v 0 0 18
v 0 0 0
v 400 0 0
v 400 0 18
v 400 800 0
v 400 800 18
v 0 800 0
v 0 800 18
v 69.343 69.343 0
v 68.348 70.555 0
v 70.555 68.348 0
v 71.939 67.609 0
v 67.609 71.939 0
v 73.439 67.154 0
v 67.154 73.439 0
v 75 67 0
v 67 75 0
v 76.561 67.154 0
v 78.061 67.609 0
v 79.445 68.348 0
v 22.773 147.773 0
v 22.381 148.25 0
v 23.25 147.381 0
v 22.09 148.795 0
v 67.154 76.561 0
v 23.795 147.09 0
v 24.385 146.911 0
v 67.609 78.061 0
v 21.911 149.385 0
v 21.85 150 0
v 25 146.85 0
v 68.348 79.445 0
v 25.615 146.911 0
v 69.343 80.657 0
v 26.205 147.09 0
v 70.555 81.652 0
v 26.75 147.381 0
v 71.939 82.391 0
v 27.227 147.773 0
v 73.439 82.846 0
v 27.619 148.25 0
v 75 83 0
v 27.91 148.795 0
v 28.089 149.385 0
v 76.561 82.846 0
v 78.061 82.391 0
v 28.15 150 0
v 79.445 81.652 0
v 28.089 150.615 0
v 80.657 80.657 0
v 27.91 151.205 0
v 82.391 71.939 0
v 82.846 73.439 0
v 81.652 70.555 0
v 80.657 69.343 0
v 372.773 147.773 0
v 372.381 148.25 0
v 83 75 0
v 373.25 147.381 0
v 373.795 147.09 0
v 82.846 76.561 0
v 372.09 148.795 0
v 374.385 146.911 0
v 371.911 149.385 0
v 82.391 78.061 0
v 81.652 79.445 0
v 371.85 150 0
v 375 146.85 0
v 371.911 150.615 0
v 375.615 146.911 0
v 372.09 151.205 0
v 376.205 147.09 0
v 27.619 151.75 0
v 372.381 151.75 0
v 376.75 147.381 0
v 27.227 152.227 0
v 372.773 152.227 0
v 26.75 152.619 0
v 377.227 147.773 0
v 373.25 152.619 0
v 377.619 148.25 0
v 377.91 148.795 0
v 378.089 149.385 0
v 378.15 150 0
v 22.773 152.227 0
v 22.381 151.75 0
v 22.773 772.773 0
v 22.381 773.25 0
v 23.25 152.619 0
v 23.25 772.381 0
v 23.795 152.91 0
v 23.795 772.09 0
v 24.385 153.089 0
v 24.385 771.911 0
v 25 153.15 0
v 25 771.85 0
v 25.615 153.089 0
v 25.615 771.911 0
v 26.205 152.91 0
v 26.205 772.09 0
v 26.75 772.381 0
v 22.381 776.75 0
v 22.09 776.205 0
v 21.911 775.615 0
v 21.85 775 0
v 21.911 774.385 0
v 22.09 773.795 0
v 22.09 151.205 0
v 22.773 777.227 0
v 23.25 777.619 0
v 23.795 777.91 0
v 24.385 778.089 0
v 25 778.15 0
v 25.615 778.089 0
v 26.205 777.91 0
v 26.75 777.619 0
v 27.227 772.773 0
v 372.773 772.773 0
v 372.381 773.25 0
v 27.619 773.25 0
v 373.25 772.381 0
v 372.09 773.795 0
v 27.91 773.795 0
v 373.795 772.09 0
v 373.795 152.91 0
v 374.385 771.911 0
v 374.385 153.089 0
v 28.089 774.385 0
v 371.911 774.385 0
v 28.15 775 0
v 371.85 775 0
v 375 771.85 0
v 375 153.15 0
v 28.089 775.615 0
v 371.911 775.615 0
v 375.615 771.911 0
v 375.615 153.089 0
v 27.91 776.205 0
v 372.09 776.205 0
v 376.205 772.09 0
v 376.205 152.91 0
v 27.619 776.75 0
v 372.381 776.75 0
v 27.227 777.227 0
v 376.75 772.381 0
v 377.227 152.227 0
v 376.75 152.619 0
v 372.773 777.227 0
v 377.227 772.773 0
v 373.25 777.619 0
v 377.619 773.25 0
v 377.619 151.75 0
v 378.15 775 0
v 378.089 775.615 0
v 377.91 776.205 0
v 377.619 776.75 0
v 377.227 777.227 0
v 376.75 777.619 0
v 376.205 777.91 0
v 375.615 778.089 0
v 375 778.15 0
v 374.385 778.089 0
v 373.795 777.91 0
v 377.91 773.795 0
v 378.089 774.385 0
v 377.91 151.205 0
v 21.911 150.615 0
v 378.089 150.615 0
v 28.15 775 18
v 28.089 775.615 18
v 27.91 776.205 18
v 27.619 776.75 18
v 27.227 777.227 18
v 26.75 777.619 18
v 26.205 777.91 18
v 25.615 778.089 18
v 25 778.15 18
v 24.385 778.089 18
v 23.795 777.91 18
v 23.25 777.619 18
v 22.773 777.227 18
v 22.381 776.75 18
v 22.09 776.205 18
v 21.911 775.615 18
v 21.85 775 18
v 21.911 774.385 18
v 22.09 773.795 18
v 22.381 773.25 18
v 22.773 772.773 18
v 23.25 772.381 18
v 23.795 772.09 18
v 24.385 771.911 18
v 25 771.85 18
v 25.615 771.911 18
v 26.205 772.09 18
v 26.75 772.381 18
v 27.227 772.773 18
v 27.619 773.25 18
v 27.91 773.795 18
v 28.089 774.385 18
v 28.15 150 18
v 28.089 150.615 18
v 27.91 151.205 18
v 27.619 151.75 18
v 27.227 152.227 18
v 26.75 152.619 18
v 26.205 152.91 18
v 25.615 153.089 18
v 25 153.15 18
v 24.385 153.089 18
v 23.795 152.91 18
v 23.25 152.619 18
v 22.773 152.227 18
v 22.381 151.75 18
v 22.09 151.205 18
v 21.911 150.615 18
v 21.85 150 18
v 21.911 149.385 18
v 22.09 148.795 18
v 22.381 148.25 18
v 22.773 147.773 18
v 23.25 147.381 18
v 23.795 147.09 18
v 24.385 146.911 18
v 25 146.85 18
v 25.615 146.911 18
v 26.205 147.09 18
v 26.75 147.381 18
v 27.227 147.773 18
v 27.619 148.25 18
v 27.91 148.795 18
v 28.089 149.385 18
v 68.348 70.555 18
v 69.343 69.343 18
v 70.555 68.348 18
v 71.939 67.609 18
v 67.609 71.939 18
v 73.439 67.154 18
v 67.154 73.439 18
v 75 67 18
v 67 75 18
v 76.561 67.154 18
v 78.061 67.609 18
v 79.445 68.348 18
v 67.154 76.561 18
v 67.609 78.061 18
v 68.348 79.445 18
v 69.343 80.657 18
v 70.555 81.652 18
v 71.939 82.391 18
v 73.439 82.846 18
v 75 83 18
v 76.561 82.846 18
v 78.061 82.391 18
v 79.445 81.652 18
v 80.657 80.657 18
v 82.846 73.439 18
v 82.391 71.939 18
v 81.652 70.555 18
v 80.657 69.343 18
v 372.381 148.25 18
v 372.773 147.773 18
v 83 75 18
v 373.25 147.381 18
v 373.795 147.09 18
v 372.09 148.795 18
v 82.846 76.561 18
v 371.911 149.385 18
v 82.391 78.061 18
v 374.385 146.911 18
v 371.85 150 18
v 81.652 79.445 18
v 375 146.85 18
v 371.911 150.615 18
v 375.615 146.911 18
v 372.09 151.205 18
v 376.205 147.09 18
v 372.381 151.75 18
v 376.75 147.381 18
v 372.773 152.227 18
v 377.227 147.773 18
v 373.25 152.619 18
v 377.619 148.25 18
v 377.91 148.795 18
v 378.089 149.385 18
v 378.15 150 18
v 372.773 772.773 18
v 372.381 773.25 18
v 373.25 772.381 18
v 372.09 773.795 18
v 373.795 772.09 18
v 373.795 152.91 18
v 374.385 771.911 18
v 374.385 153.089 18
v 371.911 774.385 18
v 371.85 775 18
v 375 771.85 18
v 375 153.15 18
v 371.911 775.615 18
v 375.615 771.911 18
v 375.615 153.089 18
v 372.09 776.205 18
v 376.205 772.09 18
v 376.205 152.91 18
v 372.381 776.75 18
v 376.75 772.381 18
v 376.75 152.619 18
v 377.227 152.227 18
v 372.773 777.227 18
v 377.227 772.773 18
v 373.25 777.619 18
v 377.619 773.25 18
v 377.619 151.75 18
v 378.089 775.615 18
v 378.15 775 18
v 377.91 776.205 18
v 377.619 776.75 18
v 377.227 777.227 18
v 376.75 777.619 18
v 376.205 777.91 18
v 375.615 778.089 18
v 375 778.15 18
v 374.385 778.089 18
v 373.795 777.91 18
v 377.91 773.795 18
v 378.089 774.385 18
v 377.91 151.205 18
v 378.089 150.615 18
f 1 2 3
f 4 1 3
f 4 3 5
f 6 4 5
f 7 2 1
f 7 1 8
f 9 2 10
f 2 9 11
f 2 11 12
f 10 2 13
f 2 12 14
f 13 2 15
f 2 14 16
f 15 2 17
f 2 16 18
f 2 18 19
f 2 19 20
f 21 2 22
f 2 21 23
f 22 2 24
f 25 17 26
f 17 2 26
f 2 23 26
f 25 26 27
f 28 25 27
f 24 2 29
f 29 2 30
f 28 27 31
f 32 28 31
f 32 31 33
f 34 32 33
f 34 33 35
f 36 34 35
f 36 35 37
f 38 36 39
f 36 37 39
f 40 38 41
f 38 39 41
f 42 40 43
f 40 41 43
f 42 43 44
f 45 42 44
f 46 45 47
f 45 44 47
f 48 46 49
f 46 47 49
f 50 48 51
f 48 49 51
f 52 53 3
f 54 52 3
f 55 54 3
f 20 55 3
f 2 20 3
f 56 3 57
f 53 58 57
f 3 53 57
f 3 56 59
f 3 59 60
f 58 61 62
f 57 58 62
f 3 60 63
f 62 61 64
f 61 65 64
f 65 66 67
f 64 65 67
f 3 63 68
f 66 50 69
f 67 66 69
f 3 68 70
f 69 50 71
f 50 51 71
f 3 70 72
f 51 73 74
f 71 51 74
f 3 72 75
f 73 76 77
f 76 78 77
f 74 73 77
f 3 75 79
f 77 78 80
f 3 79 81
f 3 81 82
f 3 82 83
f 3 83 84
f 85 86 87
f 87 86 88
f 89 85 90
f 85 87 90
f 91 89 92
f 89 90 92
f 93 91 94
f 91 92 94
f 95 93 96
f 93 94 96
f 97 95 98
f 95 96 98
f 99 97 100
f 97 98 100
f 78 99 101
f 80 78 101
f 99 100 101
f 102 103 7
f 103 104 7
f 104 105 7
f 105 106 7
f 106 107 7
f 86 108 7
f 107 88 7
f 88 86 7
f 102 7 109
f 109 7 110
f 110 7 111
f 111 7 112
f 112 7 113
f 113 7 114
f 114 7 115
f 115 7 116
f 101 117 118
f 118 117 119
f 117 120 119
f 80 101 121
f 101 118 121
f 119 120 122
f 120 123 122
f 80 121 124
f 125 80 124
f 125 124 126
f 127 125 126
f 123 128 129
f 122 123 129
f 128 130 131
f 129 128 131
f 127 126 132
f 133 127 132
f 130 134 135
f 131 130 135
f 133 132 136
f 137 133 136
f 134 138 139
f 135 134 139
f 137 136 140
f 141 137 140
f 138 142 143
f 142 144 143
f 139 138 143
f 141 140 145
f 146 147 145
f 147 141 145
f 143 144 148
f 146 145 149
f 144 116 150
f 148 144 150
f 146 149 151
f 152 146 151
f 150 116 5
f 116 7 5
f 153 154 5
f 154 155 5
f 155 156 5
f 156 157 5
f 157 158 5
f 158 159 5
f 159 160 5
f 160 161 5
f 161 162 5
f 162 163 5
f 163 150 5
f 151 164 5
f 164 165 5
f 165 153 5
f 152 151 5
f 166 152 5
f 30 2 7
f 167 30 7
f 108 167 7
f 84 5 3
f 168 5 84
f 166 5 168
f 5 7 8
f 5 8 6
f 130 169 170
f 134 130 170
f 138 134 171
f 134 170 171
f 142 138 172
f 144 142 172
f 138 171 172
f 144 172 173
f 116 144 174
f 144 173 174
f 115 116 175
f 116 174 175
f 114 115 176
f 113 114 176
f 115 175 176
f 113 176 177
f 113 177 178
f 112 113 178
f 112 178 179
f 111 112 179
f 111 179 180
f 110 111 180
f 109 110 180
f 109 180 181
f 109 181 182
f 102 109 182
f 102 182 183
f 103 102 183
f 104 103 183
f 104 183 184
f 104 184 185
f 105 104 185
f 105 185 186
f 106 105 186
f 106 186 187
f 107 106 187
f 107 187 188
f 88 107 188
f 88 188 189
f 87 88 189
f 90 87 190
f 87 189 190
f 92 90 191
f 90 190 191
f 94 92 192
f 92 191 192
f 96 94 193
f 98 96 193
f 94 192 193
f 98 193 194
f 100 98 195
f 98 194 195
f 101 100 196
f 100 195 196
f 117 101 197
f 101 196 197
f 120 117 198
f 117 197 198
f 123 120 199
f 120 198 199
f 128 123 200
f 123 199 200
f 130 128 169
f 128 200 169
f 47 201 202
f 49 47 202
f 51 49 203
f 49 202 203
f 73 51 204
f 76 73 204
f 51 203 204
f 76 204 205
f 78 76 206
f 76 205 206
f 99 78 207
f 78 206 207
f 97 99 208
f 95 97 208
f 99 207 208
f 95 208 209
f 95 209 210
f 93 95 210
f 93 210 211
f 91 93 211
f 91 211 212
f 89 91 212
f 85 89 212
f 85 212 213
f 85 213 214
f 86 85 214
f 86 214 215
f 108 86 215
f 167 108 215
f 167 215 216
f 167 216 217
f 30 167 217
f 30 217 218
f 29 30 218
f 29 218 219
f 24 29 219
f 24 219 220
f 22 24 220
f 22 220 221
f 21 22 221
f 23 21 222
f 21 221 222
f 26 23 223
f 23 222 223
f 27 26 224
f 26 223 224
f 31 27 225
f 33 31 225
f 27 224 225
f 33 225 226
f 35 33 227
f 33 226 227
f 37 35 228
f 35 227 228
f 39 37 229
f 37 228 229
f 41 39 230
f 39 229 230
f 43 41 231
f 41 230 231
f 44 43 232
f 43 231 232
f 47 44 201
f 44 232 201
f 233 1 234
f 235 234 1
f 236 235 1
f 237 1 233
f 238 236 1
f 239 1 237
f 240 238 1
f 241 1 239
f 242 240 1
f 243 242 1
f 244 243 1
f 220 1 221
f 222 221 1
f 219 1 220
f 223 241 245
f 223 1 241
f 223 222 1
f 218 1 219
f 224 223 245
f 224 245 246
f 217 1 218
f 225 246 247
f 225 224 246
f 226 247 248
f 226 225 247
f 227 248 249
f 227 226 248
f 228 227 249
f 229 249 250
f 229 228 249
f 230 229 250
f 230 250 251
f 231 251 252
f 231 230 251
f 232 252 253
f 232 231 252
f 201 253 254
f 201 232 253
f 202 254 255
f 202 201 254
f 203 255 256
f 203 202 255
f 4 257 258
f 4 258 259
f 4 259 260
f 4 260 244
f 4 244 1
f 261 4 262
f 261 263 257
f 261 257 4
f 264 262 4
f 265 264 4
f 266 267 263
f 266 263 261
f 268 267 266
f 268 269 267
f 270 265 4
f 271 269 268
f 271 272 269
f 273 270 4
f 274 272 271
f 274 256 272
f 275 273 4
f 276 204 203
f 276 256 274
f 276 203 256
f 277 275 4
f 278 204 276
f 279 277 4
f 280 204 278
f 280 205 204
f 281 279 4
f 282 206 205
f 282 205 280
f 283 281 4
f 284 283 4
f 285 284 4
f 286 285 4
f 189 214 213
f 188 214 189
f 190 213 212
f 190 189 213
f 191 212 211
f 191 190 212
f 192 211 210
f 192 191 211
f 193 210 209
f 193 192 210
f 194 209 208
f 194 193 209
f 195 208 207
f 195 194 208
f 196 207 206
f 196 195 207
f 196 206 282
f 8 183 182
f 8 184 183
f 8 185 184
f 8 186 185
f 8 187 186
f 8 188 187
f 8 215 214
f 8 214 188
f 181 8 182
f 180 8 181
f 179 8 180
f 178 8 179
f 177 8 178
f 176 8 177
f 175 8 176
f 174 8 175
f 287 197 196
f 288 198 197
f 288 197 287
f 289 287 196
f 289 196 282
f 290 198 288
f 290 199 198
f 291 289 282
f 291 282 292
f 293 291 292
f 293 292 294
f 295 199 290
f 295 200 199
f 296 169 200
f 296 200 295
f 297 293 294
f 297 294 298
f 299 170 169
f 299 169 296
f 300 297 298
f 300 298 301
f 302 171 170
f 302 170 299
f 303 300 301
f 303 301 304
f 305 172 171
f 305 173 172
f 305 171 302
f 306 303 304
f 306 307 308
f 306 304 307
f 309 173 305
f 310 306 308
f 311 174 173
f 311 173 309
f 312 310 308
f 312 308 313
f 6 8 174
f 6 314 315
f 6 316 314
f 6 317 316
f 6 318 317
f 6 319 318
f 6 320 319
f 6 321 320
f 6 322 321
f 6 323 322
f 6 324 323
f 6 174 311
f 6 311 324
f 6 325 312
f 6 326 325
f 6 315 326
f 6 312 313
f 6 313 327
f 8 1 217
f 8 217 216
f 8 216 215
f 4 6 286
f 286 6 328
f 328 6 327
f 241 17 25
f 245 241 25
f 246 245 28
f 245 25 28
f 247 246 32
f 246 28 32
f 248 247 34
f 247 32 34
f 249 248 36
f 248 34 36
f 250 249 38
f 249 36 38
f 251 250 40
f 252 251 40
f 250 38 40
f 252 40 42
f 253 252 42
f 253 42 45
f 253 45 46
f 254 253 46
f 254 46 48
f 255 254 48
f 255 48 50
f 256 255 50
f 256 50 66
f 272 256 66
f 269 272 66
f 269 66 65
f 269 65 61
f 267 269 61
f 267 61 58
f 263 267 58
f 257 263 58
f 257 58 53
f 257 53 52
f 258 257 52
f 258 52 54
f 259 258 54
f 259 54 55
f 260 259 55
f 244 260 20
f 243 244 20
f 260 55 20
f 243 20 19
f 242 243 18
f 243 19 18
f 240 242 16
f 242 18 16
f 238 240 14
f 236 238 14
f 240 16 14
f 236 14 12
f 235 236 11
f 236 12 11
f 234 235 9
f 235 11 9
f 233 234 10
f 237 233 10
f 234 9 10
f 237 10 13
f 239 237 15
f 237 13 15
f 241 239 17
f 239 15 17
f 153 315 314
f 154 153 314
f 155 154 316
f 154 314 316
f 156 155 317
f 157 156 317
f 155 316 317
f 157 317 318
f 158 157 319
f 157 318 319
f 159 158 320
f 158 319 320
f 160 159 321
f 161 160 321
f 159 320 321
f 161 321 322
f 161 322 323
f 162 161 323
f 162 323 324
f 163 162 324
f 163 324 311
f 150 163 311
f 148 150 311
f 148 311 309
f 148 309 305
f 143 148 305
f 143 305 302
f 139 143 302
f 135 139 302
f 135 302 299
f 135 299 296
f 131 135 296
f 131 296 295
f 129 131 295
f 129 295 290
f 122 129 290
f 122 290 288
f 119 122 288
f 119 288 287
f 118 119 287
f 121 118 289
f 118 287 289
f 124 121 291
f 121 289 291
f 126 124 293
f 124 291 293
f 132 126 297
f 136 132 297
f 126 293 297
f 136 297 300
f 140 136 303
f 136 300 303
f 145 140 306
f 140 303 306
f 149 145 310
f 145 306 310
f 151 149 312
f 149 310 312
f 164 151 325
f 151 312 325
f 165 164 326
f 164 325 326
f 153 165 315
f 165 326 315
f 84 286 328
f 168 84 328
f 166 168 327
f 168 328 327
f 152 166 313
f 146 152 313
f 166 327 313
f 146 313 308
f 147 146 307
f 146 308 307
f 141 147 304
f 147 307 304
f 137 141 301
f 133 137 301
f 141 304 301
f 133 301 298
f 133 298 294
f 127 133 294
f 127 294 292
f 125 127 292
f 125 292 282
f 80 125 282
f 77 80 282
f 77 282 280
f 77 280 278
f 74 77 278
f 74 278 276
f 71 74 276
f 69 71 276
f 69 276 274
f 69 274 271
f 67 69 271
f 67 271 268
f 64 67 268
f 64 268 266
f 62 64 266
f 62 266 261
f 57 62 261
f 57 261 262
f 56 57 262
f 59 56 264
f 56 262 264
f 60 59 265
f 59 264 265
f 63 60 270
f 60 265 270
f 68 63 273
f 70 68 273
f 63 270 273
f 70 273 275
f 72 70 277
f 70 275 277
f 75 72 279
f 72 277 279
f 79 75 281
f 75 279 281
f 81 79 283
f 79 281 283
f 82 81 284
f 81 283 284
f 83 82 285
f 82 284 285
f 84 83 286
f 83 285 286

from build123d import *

# Parameters (mm, degrees)
SKETCH1_W            = 400
SKETCH1_H            = 800
BASE_DEPTH           = 18
SKETCH2_R            = 3.15
MOUNTING_HOLES_DEPTH = 895.608294171
TAP_HOLE_REACH       = 896.608
SKETCH4_R            = 8


with BuildPart() as part:
    # Sketch1 → Base (new body)
    with BuildSketch(Plane.XY):
        with Locations((200, 400)):
            Rectangle(SKETCH1_W, SKETCH1_H)
    extrude(amount=BASE_DEPTH)

    # Sketch2 → Mounting holes (cut, through all)
    with BuildSketch(Plane.XY.offset(18)):
        with Locations((25, 775)):
            Circle(SKETCH2_R)
        with Locations((375, 775)):
            Circle(SKETCH2_R)
        with Locations((25, 150)):
            Circle(SKETCH2_R)
        with Locations((375, 150)):
            Circle(SKETCH2_R)
    extrude(amount=-MOUNTING_HOLES_DEPTH, mode=Mode.SUBTRACT)

    # Sketch4 → Tap hole (cut, up to next)
    with BuildSketch(Plane(origin=(0, 0, 0), x_dir=(-1, 0, 0), z_dir=(0, 0, -1)), mode=Mode.PRIVATE) as tap_hole_sk1:
        with Locations((-75, 75)):
            Circle(SKETCH4_R)
    tap_hole_tool1 = extrude(tap_hole_sk1.sketch, amount=-TAP_HOLE_REACH, mode=Mode.PRIVATE) & part.part
    add(tap_hole_tool1.solids().sort_by_distance((75, 75, 0))[0], mode=Mode.SUBTRACT)


solid = part.part
